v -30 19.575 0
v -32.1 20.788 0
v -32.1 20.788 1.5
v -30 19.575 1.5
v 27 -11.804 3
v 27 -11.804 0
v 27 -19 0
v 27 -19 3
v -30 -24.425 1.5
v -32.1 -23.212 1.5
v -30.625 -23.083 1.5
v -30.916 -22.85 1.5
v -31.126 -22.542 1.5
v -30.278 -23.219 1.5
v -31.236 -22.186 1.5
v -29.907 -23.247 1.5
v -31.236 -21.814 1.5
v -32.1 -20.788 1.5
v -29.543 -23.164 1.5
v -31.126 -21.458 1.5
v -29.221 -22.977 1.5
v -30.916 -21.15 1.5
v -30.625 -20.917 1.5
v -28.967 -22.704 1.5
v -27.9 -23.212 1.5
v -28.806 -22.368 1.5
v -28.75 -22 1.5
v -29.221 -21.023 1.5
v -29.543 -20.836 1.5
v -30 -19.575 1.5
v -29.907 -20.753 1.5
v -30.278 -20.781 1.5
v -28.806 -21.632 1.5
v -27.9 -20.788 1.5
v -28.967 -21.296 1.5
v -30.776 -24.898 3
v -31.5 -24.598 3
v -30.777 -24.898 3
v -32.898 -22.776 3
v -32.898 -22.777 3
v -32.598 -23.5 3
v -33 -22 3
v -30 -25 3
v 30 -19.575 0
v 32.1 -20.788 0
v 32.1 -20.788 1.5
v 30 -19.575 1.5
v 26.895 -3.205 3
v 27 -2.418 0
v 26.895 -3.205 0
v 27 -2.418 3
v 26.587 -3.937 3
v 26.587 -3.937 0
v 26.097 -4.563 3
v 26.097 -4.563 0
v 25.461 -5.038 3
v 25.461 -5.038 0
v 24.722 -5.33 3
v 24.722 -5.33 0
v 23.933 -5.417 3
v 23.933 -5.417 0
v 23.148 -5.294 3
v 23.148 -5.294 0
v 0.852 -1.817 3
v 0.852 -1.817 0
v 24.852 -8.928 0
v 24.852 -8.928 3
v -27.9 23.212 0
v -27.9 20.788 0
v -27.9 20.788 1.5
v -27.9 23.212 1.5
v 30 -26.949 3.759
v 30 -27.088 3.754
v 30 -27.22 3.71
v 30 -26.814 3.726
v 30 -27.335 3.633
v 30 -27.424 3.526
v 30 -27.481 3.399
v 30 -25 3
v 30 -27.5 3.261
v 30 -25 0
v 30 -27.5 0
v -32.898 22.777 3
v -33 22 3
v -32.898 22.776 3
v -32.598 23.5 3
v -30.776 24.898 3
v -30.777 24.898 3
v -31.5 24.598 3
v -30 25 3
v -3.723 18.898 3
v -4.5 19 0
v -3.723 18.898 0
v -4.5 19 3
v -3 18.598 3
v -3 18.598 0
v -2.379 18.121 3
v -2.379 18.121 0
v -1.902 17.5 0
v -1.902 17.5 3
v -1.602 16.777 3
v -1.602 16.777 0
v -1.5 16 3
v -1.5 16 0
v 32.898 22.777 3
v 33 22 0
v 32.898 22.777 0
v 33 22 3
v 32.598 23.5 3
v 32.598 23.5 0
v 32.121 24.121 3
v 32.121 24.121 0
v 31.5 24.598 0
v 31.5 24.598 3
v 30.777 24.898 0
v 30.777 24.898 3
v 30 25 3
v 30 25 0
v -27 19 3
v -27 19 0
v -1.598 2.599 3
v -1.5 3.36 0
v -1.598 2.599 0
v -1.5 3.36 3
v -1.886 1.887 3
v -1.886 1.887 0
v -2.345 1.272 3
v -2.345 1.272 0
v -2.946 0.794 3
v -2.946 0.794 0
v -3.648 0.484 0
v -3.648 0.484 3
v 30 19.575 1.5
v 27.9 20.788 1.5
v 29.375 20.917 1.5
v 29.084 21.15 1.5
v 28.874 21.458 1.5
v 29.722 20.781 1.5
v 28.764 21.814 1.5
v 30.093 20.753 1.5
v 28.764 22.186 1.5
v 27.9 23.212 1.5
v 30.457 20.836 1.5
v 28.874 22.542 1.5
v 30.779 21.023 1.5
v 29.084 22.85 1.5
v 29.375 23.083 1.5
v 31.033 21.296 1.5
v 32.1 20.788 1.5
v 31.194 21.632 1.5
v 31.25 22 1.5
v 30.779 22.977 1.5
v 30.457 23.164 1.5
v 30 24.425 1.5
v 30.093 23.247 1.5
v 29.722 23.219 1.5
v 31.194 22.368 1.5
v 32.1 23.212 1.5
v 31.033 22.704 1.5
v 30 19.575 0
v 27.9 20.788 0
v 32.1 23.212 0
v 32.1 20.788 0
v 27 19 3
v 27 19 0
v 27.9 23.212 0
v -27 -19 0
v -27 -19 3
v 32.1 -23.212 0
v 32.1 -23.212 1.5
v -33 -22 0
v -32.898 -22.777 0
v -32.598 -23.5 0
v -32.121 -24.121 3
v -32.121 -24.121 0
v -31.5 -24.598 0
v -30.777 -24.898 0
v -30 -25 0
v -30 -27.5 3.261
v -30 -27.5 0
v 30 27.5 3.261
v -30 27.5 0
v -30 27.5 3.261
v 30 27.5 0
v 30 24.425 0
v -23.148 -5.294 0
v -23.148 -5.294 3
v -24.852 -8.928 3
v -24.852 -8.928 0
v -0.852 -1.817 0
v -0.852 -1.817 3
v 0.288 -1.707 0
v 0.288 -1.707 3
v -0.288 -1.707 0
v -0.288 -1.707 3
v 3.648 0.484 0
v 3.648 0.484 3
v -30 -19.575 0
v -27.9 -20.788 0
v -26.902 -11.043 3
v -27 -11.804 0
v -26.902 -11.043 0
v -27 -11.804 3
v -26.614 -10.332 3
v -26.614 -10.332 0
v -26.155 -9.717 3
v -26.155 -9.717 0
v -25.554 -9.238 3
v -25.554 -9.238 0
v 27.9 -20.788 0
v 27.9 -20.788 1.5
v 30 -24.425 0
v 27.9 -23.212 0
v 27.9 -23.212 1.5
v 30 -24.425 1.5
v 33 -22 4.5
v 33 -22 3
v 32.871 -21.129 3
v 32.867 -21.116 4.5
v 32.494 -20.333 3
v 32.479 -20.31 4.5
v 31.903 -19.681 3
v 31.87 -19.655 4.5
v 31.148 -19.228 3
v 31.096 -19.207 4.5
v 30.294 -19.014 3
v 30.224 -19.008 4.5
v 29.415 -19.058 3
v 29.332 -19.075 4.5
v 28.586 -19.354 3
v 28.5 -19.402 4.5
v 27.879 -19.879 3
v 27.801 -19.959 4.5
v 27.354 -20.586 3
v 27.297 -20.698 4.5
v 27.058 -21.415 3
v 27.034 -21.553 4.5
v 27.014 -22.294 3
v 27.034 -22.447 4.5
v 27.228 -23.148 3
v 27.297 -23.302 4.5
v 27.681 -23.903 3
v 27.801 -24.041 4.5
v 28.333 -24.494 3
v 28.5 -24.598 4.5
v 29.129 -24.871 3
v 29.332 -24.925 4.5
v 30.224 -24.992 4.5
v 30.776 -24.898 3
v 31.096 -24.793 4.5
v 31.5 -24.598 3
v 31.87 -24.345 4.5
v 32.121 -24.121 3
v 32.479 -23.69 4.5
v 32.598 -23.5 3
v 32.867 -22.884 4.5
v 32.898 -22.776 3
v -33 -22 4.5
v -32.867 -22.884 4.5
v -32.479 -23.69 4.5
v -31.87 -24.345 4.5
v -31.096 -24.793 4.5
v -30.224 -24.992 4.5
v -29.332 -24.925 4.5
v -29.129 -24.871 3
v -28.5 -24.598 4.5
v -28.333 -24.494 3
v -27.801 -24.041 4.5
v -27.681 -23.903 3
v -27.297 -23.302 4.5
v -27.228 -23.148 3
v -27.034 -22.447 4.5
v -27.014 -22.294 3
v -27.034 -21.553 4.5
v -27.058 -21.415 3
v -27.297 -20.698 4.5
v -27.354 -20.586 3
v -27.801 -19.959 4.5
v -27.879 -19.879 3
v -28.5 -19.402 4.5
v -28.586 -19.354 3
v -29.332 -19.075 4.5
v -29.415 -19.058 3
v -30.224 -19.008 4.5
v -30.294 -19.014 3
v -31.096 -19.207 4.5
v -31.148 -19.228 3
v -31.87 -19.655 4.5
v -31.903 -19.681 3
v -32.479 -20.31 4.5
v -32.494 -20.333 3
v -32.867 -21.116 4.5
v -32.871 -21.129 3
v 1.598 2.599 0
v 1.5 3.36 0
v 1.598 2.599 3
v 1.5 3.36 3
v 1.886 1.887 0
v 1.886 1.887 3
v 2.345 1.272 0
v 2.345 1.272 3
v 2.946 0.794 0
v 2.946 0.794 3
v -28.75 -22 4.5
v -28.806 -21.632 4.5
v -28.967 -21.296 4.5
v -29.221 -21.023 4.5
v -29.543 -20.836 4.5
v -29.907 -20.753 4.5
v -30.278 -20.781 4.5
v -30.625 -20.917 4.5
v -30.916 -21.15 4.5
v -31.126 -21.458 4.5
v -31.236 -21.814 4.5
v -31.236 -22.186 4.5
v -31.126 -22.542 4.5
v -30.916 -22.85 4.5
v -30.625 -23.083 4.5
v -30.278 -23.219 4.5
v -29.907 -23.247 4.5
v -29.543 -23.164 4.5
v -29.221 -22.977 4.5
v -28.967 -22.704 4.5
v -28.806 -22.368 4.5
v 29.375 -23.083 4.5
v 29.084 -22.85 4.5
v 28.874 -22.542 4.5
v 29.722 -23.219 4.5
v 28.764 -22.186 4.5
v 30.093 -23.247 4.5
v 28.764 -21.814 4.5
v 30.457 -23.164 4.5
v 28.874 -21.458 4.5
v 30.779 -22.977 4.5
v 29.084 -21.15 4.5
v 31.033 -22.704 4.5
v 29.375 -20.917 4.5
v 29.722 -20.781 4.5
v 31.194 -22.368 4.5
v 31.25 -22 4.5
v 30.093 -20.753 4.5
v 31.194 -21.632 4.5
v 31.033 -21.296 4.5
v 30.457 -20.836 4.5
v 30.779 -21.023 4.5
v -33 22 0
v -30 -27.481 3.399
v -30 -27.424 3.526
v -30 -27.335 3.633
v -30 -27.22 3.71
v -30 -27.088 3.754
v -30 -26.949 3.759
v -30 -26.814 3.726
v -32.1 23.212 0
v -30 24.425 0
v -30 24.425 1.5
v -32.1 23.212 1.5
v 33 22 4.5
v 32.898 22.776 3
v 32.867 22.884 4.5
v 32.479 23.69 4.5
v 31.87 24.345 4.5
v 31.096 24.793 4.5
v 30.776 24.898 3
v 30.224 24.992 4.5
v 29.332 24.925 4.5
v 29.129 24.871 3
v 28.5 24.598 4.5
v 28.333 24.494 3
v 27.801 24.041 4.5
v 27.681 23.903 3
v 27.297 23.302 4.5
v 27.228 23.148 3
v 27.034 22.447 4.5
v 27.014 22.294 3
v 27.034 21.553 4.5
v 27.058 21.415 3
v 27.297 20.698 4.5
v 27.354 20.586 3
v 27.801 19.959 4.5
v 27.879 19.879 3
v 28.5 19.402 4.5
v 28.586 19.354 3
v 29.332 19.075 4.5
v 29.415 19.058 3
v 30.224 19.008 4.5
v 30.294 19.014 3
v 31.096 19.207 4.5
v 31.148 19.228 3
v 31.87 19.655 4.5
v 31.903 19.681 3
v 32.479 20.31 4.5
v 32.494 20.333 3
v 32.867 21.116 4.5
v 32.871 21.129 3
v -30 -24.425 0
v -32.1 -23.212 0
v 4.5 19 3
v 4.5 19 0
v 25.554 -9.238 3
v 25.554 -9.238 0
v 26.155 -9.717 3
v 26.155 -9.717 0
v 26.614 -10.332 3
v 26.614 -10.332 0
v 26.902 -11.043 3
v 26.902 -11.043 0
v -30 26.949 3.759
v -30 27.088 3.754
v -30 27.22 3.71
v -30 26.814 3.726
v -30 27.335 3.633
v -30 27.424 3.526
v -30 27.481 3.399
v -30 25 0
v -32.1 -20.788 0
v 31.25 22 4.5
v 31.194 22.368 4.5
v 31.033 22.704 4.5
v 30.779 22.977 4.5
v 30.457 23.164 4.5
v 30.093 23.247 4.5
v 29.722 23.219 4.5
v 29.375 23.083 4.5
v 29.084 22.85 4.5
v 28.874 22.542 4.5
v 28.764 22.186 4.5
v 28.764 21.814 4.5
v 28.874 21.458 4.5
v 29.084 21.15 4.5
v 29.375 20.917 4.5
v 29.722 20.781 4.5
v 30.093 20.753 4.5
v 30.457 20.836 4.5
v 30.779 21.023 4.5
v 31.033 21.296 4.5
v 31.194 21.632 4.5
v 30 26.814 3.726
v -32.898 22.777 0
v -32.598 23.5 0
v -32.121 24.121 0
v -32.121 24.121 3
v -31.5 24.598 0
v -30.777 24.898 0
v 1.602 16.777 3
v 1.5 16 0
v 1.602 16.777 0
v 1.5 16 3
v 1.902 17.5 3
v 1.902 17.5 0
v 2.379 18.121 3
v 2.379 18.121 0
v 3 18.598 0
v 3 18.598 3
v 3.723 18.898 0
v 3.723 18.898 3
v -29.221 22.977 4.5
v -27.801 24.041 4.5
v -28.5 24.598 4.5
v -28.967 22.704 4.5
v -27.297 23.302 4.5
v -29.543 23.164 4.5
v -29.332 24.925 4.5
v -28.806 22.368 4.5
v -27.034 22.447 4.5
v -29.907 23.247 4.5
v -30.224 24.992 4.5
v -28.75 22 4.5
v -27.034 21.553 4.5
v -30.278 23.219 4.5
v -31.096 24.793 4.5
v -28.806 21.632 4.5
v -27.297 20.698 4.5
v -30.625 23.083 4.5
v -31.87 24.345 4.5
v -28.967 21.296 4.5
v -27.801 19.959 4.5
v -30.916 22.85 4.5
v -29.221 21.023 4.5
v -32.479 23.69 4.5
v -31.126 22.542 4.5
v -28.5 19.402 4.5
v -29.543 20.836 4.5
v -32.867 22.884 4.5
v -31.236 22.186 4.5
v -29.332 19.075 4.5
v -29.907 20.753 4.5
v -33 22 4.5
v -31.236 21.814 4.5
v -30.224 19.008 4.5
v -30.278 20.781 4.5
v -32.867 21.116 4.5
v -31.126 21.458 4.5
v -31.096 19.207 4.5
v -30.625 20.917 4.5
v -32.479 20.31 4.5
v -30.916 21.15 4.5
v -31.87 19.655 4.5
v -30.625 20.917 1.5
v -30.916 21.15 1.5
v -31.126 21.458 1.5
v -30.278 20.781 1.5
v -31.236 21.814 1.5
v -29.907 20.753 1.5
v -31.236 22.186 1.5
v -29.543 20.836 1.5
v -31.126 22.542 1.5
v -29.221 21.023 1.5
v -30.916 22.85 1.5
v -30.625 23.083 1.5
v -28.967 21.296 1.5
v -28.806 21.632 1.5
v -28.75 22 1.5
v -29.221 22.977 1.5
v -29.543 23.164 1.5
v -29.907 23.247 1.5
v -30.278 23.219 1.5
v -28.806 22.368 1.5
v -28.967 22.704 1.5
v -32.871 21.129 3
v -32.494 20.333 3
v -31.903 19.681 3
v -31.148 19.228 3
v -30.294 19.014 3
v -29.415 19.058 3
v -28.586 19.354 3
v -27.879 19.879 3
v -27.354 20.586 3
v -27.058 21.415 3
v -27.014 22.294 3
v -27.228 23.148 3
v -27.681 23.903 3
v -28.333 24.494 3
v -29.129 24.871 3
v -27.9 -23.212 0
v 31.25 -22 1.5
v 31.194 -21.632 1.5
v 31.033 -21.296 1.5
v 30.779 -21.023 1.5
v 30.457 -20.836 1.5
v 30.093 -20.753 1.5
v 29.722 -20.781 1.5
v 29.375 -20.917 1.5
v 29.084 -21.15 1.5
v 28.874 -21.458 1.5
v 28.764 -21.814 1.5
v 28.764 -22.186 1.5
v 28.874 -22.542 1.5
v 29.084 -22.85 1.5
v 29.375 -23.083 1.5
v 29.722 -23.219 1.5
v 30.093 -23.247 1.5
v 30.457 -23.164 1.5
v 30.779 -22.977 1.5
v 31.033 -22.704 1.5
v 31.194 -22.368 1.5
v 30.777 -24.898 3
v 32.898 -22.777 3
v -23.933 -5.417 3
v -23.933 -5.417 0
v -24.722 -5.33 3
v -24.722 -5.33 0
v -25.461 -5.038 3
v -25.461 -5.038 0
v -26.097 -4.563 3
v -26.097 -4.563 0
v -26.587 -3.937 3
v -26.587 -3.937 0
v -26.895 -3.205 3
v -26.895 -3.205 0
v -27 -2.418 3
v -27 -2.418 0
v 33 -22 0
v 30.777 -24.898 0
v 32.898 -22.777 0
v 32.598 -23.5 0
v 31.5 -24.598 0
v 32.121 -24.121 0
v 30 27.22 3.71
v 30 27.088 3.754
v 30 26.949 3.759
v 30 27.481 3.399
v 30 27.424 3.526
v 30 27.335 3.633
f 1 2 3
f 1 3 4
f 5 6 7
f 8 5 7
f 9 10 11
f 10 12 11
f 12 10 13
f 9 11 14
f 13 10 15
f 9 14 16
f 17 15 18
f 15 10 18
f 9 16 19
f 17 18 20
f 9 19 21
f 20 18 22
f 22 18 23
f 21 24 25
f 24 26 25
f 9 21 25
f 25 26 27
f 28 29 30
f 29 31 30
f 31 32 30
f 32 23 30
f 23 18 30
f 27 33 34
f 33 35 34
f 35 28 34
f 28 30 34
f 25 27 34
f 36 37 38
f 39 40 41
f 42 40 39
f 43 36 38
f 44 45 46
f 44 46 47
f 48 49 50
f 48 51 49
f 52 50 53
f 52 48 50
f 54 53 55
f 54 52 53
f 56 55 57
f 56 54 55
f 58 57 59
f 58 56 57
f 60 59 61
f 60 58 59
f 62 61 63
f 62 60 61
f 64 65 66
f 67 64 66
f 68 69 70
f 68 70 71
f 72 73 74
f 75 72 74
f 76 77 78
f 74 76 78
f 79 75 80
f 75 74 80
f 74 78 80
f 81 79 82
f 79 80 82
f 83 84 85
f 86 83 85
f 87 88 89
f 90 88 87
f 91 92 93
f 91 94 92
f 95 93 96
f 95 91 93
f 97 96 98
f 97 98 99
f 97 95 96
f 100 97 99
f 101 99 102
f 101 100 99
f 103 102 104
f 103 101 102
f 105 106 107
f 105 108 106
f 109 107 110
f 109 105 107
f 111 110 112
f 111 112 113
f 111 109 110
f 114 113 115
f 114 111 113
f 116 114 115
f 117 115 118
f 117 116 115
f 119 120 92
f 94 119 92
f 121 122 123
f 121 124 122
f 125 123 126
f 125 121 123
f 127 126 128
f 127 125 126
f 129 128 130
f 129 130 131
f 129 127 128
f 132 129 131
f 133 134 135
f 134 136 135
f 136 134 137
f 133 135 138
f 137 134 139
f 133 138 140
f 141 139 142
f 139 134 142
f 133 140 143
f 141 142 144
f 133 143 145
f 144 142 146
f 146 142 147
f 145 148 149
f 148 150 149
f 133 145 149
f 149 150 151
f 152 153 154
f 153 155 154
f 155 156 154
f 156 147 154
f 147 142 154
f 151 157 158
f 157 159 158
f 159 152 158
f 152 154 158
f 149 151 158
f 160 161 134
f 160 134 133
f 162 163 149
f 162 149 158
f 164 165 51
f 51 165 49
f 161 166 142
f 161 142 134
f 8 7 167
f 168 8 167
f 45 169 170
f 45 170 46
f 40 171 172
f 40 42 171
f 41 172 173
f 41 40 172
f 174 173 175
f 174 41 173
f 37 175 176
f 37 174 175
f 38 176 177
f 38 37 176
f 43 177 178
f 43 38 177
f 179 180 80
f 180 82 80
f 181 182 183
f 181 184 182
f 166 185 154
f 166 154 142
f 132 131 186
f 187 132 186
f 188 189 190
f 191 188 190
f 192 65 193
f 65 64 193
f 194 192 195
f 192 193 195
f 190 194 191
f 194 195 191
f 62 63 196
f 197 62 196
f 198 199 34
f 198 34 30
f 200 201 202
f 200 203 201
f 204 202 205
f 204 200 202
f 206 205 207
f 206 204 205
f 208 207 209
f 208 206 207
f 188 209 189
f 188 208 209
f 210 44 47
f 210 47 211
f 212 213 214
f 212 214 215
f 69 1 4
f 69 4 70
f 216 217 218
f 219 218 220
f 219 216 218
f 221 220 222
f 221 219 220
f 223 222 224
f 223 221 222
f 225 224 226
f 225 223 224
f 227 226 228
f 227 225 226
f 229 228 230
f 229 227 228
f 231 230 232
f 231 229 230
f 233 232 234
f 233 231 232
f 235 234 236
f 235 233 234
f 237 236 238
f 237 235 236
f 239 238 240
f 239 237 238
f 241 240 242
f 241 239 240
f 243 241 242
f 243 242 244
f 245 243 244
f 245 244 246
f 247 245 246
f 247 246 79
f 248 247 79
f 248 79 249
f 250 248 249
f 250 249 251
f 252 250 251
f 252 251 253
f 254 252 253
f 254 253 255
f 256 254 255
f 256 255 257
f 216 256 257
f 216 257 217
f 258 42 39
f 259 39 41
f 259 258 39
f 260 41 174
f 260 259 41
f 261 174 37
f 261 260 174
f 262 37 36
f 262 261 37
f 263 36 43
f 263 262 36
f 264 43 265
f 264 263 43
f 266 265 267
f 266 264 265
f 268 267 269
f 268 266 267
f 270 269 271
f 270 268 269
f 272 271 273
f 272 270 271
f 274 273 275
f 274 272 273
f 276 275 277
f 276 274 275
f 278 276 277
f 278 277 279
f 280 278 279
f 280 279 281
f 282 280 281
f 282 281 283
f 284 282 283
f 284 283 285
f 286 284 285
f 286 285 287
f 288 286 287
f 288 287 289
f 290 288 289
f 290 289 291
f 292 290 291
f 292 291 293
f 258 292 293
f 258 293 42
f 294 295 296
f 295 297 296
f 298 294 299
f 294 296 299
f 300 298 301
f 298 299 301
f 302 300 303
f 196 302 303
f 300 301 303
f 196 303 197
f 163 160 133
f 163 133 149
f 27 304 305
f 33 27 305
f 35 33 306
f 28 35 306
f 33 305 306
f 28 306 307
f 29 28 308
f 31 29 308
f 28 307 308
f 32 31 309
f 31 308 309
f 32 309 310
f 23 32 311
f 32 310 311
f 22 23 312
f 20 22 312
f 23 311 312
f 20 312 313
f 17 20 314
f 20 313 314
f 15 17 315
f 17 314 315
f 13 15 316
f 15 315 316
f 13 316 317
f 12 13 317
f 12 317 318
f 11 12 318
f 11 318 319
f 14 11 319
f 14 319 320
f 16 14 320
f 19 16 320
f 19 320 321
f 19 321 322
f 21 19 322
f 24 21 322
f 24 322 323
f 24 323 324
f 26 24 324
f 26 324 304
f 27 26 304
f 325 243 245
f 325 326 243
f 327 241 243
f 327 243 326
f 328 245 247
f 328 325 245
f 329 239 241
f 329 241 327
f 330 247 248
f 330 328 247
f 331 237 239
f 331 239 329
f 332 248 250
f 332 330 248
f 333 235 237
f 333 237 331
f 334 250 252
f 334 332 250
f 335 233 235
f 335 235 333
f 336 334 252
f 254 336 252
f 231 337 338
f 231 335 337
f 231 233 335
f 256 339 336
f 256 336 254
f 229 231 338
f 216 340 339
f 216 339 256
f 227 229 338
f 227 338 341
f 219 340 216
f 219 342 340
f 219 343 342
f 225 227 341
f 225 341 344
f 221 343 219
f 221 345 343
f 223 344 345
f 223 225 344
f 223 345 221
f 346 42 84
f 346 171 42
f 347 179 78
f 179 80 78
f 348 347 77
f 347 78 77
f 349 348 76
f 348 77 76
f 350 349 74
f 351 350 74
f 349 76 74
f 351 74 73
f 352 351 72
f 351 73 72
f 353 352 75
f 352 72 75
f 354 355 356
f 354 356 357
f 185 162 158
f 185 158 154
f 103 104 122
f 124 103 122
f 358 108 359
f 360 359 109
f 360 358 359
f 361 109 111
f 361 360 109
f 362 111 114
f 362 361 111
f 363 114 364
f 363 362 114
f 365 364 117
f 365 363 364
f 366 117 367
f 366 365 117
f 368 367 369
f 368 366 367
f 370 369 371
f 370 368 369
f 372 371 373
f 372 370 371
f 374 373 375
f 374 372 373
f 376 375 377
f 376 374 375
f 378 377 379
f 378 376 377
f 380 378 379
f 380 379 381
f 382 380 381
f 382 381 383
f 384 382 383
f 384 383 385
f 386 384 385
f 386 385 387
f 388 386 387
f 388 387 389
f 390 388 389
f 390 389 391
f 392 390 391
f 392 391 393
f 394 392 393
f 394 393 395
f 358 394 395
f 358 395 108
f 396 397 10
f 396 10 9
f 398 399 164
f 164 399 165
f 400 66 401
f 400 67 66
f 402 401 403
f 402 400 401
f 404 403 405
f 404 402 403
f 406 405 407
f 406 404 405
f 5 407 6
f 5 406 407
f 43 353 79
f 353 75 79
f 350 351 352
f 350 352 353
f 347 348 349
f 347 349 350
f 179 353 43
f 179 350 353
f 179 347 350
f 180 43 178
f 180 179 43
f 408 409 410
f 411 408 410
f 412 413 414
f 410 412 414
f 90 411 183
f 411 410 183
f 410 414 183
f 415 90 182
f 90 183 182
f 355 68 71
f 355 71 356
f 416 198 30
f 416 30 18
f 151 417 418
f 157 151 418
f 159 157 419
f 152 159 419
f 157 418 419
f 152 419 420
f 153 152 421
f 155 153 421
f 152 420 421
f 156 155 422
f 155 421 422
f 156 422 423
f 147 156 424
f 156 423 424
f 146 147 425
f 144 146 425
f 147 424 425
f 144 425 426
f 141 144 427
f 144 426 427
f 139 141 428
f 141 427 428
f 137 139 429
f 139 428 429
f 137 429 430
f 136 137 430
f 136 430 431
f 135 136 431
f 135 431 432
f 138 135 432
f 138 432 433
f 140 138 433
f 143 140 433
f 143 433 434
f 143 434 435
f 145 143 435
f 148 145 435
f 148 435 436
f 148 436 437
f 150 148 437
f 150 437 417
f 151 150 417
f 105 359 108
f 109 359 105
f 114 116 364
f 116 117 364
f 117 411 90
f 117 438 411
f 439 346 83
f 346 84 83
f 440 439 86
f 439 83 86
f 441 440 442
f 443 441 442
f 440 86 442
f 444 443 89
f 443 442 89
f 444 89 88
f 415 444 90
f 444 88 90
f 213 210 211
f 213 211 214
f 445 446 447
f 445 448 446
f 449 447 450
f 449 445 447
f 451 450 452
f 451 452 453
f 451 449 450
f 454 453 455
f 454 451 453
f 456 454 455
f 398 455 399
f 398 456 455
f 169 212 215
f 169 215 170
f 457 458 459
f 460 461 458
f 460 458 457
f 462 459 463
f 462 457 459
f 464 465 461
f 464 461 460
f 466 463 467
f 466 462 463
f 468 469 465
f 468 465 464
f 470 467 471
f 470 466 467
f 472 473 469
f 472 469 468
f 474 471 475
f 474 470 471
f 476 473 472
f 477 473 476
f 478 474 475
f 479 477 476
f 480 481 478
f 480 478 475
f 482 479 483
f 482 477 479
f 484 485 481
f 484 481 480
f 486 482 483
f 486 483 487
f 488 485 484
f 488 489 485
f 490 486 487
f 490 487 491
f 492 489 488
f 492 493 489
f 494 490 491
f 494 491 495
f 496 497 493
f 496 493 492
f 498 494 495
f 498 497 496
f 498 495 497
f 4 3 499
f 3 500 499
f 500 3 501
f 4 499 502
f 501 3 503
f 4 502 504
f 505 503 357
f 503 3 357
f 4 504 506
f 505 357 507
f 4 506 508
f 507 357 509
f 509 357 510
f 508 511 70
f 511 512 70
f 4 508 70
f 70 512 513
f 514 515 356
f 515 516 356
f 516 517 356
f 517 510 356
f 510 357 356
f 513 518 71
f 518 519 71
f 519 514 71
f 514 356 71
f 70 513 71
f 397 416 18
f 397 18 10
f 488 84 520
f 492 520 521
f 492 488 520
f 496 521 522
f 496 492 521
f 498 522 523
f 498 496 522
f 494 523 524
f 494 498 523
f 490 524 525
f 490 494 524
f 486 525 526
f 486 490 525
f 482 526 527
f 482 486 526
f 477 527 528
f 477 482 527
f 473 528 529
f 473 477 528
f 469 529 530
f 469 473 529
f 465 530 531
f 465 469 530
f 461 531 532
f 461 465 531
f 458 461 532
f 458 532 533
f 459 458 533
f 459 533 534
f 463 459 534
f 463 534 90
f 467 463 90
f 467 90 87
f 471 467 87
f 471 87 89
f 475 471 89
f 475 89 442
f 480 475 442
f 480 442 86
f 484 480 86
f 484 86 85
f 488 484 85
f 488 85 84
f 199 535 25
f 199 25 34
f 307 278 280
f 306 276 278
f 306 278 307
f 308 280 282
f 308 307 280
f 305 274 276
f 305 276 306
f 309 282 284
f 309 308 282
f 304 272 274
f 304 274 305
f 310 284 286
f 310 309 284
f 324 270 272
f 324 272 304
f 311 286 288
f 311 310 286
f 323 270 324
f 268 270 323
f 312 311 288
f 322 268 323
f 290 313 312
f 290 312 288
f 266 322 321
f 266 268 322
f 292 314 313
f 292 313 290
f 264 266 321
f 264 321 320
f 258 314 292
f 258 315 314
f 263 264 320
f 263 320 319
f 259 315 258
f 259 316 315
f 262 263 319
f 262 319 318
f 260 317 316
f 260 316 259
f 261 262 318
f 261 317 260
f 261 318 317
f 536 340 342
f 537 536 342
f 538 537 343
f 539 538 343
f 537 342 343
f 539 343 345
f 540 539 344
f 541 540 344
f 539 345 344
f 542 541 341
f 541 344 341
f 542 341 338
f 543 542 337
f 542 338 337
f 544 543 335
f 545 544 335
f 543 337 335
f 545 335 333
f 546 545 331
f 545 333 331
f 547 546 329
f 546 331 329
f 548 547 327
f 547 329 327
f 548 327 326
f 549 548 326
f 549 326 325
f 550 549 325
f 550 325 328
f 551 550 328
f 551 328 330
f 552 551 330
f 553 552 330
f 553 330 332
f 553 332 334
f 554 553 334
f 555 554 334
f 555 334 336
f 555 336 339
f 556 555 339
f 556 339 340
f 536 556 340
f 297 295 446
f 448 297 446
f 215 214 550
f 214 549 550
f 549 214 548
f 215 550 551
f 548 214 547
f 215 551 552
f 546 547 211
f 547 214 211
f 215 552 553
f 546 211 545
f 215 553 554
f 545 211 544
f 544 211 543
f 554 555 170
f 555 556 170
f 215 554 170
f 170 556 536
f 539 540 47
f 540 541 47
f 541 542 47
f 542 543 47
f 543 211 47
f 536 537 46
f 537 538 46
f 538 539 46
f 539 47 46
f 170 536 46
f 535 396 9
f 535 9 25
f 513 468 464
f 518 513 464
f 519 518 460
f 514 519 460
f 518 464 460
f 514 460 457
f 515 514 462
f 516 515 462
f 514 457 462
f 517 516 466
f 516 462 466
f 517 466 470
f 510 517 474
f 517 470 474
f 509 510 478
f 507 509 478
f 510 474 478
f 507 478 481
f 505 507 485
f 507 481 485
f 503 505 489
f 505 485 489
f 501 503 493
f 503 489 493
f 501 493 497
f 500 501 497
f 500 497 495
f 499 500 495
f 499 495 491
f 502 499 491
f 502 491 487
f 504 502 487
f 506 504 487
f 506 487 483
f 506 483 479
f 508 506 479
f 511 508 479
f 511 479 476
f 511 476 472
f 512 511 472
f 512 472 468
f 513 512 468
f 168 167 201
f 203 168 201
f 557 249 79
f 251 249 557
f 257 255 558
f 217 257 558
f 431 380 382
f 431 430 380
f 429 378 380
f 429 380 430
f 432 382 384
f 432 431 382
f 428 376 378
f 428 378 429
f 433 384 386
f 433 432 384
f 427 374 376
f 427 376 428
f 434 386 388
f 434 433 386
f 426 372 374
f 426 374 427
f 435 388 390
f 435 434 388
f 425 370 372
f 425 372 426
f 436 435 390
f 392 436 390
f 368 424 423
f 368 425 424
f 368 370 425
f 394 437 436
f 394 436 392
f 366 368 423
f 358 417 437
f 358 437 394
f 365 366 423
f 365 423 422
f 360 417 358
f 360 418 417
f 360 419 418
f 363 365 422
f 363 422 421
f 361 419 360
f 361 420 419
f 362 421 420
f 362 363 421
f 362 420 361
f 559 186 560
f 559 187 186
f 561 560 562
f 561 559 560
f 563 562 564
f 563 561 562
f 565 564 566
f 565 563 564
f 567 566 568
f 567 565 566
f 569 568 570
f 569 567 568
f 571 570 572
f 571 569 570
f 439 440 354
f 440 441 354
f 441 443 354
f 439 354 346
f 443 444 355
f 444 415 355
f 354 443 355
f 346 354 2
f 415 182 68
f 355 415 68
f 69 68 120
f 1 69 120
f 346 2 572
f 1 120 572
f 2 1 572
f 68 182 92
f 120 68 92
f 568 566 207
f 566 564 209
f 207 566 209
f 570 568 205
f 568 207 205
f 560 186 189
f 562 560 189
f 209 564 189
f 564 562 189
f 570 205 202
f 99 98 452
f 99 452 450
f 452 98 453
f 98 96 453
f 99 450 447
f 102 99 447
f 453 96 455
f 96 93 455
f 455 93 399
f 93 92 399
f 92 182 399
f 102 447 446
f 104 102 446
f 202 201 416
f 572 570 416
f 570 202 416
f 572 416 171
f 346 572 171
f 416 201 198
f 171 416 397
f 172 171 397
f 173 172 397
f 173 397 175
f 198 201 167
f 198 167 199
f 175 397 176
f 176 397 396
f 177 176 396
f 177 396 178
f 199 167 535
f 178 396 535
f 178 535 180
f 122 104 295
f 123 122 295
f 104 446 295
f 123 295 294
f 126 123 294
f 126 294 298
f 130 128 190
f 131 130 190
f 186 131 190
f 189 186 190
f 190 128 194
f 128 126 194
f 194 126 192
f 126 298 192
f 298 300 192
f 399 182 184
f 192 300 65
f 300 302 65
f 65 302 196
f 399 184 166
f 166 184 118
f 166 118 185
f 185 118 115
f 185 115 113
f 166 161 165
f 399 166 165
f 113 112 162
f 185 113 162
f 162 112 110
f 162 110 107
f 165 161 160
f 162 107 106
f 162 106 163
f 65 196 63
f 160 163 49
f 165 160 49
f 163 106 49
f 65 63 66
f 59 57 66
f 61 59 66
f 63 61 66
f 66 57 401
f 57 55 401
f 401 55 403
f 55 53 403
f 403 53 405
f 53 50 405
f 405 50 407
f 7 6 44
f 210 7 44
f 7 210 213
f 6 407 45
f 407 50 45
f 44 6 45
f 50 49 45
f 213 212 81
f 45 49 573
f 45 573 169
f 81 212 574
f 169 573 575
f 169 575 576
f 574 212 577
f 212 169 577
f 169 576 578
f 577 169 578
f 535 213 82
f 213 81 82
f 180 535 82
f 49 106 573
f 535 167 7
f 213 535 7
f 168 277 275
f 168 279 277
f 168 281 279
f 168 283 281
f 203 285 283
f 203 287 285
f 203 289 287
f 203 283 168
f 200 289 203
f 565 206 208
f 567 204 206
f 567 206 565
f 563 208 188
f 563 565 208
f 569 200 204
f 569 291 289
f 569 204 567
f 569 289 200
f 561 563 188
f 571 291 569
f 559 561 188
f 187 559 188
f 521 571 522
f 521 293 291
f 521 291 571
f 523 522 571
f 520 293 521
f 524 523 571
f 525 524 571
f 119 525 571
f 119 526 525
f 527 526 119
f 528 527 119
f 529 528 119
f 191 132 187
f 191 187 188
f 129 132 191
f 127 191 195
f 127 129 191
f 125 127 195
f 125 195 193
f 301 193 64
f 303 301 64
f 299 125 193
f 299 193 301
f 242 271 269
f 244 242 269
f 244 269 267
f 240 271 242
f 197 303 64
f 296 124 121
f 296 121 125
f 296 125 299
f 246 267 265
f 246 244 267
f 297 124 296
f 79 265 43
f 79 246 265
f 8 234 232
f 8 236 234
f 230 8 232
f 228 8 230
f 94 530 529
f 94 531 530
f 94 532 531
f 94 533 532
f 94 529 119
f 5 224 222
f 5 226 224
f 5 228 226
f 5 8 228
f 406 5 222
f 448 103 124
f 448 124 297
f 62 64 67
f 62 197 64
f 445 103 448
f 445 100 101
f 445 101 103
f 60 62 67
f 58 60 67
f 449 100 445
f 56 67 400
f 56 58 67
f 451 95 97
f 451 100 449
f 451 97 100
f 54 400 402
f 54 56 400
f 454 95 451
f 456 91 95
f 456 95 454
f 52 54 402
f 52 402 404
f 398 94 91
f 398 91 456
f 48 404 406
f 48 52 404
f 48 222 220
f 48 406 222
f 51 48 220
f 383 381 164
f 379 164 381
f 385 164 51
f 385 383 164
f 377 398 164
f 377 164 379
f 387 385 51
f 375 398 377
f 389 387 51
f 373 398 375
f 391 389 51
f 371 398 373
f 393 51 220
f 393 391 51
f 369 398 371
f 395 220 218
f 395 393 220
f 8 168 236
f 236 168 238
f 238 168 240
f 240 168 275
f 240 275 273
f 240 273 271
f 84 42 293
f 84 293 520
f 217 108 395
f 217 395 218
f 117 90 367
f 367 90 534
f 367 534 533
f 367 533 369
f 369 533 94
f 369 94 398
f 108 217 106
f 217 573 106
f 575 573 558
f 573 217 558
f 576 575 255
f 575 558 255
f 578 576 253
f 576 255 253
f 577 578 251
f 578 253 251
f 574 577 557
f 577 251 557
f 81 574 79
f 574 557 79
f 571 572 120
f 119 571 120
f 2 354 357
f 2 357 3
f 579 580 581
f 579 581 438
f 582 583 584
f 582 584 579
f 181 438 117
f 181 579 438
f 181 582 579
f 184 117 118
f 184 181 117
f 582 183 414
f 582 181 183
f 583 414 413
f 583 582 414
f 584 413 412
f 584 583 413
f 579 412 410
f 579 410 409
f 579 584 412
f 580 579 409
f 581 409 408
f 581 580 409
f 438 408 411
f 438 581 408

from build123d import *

# Parameters (mm, degrees)
SKETCH2_W            = 66
SKETCH2_H            = 50
BOSS_EXTRUDE1_DEPTH  = 3
SKETCH3_R            = 1.25
CUT_EXTRUDE1_DEPTH   = 3
CUT_EXTRUDE2_DEPTH   = 1.5
CUT_EXTRUDE3_DEPTH   = 42.509035161
BOSS_EXTRUDE2_START  = 1.5
SKETCH6_R            = 3
SKETCH6_R_2          = 1.25
BOSS_EXTRUDE2_DEPTH  = 1.5
FILLET1_R            = 3
BOSS_EXTRUDE3_DEPTH  = 30
FILLET2_R            = 0.5
FILLET2_OF_MIRROR1_R = 0.5


with BuildPart() as part:
    # Sketch2 → Boss-Extrude1 (new body)
    with BuildSketch(Plane.XY):
        Rectangle(SKETCH2_W, SKETCH2_H)
    extrude(amount=BOSS_EXTRUDE1_DEPTH)

    # Sketch3 → Cut-Extrude1 (cut)
    with BuildSketch(Plane.XY.offset(3)):
        with Locations((-30, 22)):
            Circle(SKETCH3_R)
        with Locations((30, 22)):
            Circle(SKETCH3_R)
        with Locations((30, -22)):
            Circle(SKETCH3_R)
        with Locations((-30, -22)):
            Circle(SKETCH3_R)
    extrude(amount=-CUT_EXTRUDE1_DEPTH, mode=Mode.SUBTRACT)

    # Sketch4 → Cut-Extrude2 (cut)
    with BuildSketch(Plane(origin=(0, 0, 0), x_dir=(-1, 0, 0), z_dir=(0, 0, -1))):
        Polygon((30, 24.424871131), (32.1, 23.212435565), (32.1, 20.787564435), (30, 19.575128869), (27.9, 20.787564435), (27.9, 23.212435565), align=None)
        Polygon((-30, 24.424871131), (-27.9, 23.212435565), (-27.9, 20.787564435), (-30, 19.575128869), (-32.1, 20.787564435), (-32.1, 23.212435565), align=None)
        Polygon((-30, -19.575128869), (-27.9, -20.787564435), (-27.9, -23.212435565), (-30, -24.424871131), (-32.1, -23.212435565), (-32.1, -20.787564435), align=None)
        Polygon((30, -19.575128869), (32.1, -20.787564435), (32.1, -23.212435565), (30, -24.424871131), (27.9, -23.212435565), (27.9, -20.787564435), align=None)
    extrude(amount=-CUT_EXTRUDE2_DEPTH, mode=Mode.SUBTRACT)

    # Sketch5 → Cut-Extrude3 (cut, through all)
    with BuildSketch(Plane(origin=(0, 0, 0), x_dir=(-1, 0, 0), z_dir=(0, 0, -1))):
        Polygon((-1.5, 1.120014204), (-1.5, 19), (-27, 19), (-27, -6.435541351), align=None)
        Polygon((27, 19), (1.5, 19), (1.5, 1.120014204), (27, -6.435541351), align=None)
        Polygon((0, -1.564458649), (-27, -9.564458649), (-27, -19), (27, -19), (27, -9.564458649), align=None)
    extrude(amount=-CUT_EXTRUDE3_DEPTH, mode=Mode.SUBTRACT)

    # Sketch6 → Boss-Extrude2 (add)
    # profile 1 of 4: a face of its own
    with BuildSketch(Plane.XY.offset(3).offset(BOSS_EXTRUDE2_START)):
        with Locations((30, 22)):
            Circle(SKETCH6_R)
        with Locations((30, 22)):
            Circle(SKETCH6_R_2, mode=Mode.SUBTRACT)
    # profile 2 of 4: a face of its own
    with BuildSketch(Plane.XY.offset(3).offset(BOSS_EXTRUDE2_START)):
        with Locations((-30, 22)):
            Circle(SKETCH6_R)
        with Locations((-30, 22)):
            Circle(SKETCH6_R_2, mode=Mode.SUBTRACT)
    # profile 3 of 4: a face of its own
    with BuildSketch(Plane.XY.offset(3).offset(BOSS_EXTRUDE2_START)):
        with Locations((-30, -22)):
            Circle(SKETCH6_R)
        with Locations((-30, -22)):
            Circle(SKETCH6_R_2, mode=Mode.SUBTRACT)
    # profile 4 of 4: a face of its own
    with BuildSketch(Plane.XY.offset(3).offset(BOSS_EXTRUDE2_START)):
        with Locations((30, -22)):
            Circle(SKETCH6_R)
        with Locations((30, -22)):
            Circle(SKETCH6_R_2, mode=Mode.SUBTRACT)
    extrude(amount=-BOSS_EXTRUDE2_DEPTH)

    # Fillet1
    fillet1_edges = [part.edges().sort_by_distance(p)[0] for p in [
        (27, -9.564458649, 1.5),
        (-27, -9.564458649, 1.5),
        (-27, -6.435541351, 1.5),
        (27, -6.435541351, 1.5),
        (0, -1.564458649, 1.5),
        (1.5, 1.120014204, 1.5),
        (-1.5, 1.120014204, 1.5),
        (1.5, 19, 1.5),
        (-1.5, 19, 1.5),
        (-33, 25, 1.5),
        (-33, -25, 1.5),
        (33, -25, 1.5),
        (33, 25, 1.5),
    ]]
    fillet(fillet1_edges, radius=FILLET1_R)

    # Sketch7 → Boss-Extrude3 (add, symmetric)
    with BuildSketch(Plane(origin=(0, 0, 0), x_dir=(0, 0, -1), z_dir=(1, 0, 0))):
        Polygon((0, 25), (0, 27.5), (-4, 27.5), (-3, 25), align=None)
    boss_extrude3 = extrude(amount=BOSS_EXTRUDE3_DEPTH, both=True)

    # Fillet2
    fillet2_edges = [part.edges().sort_by_distance(p)[0] for p in [
        (0, 27.5, 4),
    ]]
    fillet(fillet2_edges, radius=FILLET2_R)

    # Mirror1: Boss-Extrude3 across plane
    add(boss_extrude3.mirror(Plane.ZX))

    # Fillet2 of Mirror1
    fillet2_of_mirror1_edges = [part.edges().sort_by_distance(p)[0] for p in [
        (0, -27.5, 4),
    ]]
    fillet(fillet2_of_mirror1_edges, radius=FILLET2_OF_MIRROR1_R)


solid = part.part
